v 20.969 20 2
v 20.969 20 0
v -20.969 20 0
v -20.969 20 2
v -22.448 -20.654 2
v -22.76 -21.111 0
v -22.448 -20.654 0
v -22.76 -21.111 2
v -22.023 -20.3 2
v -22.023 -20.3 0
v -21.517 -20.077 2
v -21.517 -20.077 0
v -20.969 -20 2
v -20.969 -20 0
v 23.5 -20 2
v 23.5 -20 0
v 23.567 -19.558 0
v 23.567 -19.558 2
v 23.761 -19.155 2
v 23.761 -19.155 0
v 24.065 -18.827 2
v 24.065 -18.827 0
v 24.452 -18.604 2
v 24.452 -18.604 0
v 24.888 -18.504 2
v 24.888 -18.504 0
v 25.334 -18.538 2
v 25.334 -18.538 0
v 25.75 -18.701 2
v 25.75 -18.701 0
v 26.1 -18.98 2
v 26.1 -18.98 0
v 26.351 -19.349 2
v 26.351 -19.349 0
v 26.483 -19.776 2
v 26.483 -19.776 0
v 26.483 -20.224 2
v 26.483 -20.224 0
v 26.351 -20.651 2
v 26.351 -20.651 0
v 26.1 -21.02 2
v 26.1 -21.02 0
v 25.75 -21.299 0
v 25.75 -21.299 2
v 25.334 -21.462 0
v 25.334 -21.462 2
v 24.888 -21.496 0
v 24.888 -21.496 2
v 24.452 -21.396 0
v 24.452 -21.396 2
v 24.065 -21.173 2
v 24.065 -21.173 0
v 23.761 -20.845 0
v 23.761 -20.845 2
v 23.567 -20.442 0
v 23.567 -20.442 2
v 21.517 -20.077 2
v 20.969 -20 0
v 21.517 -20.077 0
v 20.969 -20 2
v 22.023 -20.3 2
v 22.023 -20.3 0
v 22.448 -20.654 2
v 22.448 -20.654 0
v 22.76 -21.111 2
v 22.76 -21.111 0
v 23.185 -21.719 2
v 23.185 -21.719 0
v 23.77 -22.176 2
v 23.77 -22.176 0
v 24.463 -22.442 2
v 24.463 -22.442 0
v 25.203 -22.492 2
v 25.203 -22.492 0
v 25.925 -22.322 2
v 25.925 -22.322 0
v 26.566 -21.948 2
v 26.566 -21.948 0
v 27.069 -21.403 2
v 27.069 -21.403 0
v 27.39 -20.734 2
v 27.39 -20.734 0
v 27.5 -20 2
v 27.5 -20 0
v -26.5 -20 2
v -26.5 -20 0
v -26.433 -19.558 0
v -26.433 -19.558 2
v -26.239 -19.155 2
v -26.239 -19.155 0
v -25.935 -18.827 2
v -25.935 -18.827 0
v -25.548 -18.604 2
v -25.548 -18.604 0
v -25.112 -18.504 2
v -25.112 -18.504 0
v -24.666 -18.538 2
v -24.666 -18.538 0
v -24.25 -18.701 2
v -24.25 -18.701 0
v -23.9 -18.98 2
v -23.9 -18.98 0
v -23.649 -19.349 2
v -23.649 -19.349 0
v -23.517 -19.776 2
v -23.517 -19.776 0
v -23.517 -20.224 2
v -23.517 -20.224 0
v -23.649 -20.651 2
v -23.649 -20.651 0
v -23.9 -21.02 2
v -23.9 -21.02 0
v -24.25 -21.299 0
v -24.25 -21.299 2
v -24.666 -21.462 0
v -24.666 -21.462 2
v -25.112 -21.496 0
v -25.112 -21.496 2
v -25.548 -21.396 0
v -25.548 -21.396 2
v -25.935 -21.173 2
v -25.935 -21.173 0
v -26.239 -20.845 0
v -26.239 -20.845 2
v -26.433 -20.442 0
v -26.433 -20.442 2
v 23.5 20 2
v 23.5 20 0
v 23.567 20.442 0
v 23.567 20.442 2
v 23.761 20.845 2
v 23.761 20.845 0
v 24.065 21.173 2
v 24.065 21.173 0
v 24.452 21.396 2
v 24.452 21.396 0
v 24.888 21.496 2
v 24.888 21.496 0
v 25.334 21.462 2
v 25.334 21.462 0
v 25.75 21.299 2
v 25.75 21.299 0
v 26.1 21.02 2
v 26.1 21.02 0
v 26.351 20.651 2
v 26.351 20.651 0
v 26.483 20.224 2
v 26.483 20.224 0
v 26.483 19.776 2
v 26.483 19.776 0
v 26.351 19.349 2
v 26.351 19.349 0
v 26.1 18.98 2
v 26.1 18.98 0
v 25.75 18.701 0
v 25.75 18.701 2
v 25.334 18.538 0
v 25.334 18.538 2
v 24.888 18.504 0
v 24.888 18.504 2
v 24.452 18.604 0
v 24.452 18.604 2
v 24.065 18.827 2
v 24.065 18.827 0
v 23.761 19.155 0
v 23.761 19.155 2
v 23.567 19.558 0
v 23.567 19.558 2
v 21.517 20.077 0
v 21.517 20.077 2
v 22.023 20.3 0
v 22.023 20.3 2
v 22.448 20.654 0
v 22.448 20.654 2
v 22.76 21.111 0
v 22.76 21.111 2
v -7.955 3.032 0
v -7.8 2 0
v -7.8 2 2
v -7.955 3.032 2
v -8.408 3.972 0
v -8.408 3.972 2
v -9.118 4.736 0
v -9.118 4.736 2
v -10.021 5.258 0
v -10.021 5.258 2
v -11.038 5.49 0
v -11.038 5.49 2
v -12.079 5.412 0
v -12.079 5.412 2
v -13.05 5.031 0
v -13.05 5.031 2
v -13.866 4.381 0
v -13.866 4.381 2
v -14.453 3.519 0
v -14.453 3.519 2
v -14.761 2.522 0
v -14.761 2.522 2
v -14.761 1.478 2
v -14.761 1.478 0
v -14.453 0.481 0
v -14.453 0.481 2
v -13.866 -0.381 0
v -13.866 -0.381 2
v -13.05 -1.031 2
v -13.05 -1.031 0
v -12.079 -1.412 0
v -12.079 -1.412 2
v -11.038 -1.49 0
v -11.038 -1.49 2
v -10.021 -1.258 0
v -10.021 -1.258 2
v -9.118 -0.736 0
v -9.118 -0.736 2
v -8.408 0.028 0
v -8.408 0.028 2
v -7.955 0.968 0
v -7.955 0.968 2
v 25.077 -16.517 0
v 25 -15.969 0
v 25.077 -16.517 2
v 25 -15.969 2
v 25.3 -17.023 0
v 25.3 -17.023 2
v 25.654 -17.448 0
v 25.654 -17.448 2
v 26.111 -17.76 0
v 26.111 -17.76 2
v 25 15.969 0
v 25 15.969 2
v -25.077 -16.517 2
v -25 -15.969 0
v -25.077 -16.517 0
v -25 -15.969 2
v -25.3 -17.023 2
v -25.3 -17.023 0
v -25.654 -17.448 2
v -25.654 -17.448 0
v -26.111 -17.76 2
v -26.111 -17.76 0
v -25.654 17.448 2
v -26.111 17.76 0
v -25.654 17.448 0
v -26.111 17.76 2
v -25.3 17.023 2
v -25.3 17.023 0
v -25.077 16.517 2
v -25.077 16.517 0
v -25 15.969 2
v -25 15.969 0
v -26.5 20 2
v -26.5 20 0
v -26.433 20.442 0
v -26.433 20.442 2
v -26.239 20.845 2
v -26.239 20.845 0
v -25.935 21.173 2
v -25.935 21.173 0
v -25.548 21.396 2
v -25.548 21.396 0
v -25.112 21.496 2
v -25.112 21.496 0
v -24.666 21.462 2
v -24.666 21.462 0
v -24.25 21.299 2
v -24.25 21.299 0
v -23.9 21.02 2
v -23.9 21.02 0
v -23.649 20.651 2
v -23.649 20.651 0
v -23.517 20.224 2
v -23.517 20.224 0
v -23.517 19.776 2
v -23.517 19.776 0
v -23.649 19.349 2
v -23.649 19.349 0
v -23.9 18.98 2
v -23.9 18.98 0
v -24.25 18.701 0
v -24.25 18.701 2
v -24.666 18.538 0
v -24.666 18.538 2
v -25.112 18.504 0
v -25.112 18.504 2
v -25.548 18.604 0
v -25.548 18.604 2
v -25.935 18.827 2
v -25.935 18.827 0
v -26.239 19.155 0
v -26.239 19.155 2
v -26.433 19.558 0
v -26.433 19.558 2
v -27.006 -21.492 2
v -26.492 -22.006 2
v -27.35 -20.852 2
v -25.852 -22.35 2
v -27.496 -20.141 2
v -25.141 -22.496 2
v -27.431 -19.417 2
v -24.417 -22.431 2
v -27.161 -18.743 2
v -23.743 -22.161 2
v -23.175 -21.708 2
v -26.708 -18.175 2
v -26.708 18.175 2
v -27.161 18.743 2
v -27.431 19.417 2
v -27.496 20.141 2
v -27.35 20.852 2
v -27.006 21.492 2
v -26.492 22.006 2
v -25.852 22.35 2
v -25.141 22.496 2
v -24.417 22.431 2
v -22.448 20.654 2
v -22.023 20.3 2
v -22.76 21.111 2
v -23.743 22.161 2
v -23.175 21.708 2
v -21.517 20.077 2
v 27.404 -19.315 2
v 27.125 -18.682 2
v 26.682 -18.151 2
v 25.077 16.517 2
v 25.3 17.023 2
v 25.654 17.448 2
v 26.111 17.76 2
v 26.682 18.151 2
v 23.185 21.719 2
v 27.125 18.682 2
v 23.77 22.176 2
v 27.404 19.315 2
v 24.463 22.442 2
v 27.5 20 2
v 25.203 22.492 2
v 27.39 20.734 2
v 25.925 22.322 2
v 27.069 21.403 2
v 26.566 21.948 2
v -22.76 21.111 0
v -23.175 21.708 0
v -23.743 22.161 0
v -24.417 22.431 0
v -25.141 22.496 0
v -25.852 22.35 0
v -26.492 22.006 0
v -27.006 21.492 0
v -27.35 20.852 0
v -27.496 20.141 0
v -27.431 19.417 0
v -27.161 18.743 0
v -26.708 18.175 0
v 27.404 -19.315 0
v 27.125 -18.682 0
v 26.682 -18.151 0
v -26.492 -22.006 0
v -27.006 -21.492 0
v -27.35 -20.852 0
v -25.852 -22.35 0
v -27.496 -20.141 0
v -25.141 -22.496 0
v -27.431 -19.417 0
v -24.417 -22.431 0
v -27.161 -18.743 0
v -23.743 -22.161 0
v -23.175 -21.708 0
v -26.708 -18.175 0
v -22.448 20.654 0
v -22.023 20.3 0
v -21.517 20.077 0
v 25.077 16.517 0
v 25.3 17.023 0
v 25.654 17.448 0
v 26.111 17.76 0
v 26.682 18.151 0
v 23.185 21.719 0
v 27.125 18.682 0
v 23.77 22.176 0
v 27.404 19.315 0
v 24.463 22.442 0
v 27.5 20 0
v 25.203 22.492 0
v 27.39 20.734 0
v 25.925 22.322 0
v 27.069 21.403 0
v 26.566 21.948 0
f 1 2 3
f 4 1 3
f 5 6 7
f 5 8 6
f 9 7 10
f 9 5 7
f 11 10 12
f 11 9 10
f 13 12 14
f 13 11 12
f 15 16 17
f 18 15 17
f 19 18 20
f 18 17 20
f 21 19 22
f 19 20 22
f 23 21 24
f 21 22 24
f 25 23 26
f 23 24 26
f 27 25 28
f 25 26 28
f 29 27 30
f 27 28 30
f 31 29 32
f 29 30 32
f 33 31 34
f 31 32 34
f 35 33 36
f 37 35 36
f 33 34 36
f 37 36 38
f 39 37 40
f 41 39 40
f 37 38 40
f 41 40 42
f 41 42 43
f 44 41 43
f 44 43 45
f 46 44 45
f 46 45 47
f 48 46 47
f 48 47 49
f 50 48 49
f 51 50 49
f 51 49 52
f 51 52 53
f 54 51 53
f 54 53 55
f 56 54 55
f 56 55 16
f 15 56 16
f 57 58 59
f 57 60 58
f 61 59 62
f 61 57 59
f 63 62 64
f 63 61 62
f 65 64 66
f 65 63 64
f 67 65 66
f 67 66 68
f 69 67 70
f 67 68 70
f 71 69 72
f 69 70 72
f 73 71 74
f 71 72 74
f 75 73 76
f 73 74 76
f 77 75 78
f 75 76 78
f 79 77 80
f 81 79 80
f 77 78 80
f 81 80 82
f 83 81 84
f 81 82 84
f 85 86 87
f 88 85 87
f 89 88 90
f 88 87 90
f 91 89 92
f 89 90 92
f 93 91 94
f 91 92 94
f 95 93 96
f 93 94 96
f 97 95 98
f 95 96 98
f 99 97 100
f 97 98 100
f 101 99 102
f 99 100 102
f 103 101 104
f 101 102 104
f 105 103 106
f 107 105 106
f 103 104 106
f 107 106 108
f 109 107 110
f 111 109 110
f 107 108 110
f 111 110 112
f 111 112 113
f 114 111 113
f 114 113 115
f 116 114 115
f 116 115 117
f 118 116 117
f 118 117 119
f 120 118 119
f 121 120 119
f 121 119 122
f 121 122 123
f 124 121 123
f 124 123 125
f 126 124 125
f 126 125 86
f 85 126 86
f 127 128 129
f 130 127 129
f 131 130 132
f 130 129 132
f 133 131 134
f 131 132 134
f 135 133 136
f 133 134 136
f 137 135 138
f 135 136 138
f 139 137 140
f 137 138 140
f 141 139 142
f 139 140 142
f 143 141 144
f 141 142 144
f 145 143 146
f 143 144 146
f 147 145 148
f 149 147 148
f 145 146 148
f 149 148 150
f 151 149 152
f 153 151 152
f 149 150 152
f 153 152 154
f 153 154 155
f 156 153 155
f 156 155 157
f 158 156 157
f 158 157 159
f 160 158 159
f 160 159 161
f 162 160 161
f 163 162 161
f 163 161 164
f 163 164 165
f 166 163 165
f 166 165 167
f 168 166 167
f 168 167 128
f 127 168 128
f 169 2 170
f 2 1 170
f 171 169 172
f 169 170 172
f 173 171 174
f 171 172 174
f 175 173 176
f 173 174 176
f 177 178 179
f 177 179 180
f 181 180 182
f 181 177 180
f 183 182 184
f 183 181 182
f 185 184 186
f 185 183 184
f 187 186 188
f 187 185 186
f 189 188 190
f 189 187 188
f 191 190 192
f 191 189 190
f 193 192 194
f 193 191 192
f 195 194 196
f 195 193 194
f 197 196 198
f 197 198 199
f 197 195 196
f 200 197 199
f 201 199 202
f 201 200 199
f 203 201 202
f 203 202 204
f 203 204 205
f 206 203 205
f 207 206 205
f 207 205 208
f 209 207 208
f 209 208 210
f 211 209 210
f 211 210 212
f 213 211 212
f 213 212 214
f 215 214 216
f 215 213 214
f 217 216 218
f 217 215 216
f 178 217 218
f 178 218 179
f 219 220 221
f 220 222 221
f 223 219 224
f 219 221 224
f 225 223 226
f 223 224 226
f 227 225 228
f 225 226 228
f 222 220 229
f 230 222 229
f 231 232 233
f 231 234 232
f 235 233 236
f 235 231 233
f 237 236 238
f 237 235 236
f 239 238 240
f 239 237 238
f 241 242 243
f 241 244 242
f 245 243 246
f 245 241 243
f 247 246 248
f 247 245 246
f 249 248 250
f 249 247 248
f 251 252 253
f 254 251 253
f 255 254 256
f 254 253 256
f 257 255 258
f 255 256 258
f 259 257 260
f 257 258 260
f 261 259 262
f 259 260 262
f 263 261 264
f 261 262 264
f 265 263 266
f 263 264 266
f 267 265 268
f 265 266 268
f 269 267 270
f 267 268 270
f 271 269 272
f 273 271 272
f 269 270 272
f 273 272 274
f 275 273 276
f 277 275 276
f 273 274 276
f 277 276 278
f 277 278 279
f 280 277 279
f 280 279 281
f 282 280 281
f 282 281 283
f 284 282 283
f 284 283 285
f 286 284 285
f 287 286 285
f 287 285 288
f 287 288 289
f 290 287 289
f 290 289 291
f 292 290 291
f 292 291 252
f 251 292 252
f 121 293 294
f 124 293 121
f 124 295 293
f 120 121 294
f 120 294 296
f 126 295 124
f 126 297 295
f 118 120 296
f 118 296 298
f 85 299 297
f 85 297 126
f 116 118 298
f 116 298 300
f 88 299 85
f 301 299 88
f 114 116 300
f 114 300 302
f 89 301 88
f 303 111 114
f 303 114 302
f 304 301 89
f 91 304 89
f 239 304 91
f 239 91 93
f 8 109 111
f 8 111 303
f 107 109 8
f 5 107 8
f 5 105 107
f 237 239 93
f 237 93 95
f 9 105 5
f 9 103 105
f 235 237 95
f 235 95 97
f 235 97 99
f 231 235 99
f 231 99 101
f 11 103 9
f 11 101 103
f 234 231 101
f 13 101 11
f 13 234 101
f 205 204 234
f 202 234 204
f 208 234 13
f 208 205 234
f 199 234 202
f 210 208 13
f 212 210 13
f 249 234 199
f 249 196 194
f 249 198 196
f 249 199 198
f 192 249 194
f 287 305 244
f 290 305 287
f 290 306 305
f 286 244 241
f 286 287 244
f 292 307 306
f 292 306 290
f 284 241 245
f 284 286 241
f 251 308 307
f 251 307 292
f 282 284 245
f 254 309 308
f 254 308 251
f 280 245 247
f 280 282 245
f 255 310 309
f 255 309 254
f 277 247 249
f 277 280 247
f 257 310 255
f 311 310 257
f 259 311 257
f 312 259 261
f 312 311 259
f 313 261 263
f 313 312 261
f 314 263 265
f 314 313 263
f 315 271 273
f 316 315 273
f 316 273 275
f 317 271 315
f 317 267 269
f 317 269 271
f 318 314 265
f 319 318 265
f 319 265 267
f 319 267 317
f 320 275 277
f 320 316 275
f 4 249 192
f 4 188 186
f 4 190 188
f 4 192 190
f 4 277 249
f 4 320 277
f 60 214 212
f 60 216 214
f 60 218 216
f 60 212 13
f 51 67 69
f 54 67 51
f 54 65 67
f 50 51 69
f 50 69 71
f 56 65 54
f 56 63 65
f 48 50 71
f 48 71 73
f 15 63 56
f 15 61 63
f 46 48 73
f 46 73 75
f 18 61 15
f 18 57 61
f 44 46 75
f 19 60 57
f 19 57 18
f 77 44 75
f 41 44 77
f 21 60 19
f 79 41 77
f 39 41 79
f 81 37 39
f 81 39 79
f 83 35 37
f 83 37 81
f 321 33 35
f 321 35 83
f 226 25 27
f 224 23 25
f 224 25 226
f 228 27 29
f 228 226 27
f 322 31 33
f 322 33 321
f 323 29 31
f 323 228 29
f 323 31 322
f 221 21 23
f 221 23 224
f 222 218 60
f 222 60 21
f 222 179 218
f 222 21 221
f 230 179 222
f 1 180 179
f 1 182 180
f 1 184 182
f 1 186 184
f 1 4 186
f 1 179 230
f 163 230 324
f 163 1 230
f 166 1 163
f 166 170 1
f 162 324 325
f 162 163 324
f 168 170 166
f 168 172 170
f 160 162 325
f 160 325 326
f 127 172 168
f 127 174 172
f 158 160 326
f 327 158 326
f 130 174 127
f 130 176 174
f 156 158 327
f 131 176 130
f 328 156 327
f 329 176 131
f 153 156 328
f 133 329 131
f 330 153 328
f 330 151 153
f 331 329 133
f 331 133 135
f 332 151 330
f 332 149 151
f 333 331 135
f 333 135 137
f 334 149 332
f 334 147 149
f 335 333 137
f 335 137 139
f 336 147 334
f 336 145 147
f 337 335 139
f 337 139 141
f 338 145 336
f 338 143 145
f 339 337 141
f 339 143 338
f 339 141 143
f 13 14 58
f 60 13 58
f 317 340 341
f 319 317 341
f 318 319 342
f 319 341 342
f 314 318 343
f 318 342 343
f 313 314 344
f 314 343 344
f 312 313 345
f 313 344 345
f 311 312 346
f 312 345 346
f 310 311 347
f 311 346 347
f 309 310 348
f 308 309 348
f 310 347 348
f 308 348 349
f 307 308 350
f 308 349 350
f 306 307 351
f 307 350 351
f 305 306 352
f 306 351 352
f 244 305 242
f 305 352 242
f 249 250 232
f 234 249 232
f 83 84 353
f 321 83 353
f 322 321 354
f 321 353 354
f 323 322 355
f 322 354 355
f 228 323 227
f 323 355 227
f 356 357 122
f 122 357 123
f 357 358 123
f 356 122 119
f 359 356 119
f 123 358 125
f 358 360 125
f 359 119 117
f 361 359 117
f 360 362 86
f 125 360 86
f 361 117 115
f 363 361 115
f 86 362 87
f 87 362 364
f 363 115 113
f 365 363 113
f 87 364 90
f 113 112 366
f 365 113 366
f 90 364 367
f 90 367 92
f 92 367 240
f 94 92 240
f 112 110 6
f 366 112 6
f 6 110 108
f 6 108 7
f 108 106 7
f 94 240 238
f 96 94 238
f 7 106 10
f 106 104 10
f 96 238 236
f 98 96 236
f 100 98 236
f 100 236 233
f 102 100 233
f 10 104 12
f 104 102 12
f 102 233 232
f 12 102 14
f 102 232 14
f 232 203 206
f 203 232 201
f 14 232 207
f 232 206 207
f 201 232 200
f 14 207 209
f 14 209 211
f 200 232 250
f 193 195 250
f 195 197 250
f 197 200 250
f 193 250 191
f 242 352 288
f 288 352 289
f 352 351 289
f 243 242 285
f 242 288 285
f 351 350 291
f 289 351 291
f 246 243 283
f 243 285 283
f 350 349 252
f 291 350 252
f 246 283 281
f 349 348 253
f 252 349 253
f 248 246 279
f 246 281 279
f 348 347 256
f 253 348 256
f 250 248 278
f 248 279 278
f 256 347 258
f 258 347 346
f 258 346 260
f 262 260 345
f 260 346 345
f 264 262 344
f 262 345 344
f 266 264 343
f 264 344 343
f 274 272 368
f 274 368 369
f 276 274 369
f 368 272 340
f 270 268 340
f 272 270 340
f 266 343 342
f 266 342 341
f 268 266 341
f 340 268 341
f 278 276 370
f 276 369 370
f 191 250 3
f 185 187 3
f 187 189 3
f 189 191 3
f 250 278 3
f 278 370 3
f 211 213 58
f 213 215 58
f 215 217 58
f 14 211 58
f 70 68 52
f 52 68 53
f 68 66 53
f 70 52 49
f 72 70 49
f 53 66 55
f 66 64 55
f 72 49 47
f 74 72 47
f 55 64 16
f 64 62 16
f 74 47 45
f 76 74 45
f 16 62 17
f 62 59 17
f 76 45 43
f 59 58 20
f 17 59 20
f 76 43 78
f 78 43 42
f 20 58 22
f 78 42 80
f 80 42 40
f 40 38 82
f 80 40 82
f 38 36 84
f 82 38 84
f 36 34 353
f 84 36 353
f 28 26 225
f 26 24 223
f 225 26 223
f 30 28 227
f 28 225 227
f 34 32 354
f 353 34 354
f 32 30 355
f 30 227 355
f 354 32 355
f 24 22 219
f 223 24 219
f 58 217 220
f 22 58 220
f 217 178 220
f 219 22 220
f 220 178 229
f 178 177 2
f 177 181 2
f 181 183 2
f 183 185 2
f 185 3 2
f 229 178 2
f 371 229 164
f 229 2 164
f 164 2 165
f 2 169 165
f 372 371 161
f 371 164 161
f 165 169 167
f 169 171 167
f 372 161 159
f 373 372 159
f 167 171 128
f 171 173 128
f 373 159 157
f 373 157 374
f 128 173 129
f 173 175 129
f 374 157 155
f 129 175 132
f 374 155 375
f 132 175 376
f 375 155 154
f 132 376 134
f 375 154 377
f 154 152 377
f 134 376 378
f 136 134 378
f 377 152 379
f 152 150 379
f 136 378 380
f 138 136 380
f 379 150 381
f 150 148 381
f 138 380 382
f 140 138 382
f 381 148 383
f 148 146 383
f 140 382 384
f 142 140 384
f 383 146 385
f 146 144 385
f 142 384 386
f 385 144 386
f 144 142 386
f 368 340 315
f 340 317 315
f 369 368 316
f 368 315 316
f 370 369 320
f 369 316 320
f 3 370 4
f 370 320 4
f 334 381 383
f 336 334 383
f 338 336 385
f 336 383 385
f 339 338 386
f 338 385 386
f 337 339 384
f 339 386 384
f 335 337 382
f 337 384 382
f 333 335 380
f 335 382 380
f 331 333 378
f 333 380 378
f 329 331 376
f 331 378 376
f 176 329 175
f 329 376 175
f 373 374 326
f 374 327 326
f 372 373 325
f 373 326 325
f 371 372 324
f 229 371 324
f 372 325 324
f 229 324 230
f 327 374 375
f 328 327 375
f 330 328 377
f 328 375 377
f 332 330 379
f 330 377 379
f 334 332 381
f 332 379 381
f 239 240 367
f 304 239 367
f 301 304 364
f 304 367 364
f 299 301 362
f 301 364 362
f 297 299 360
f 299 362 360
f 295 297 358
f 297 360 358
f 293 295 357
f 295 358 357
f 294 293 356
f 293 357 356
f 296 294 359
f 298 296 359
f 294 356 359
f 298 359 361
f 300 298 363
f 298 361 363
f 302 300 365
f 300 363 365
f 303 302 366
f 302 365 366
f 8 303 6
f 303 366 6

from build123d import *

# Parameters (mm, degrees)
F0_R     = 3.5
F1_DEPTH = 2
F3_D     = 3
F4_R     = 2


with BuildPart() as f1:
    # F0 (on Top) → F1 (new body)
    with BuildSketch(Plane.XY):
        with BuildLine():
            Line((-25, 17.5), (-25, 20))
            Line((-25, 20), (-22.5, 20))
            ThreePointArc((-22.5, 20), (-26.767766953, 21.767766953), (-25, 17.5))
        make_face()
        with BuildLine():
            Line((-22.5, 20), (-25, 20))
            Line((-25, 20), (-25, 17.5))
            ThreePointArc((-25, 17.5), (-23.232233047, 18.232233047), (-22.5, 20))
        make_face()
        with BuildLine():
            Line((22.5, 20), (-22.5, 20))
            ThreePointArc((-22.5, 20), (-23.232233047, 18.232233047), (-25, 17.5))
            Line((-25, 17.5), (-25, -17.5))
            ThreePointArc((-25, -17.5), (-23.232233047, -18.232233047), (-22.5, -20))
            Line((-22.5, -20), (22.5, -20))
            ThreePointArc((22.5, -20), (23.232233047, -18.232233047), (25, -17.5))
            Line((25, -17.5), (25, 17.5))
            ThreePointArc((25, 17.5), (23.232233047, 18.232233047), (22.5, 20))
        make_face()
        with Locations((-11.3, 2)):
            Circle(F0_R, mode=Mode.SUBTRACT)
        with BuildLine():
            ThreePointArc((27.5, 20), (25, 22.5), (22.5, 20))
            Line((22.5, 20), (25, 20))
            Line((25, 20), (25, 17.5))
            ThreePointArc((25, 17.5), (26.767766953, 18.232233047), (27.5, 20))
        make_face()
        with BuildLine():
            Line((25, 20), (22.5, 20))
            ThreePointArc((22.5, 20), (23.232233047, 18.232233047), (25, 17.5))
            Line((25, 17.5), (25, 20))
        make_face()
        with BuildLine():
            ThreePointArc((-22.5, -20), (-23.232233047, -18.232233047), (-25, -17.5))
            Line((-25, -17.5), (-25, -20))
            Line((-25, -20), (-22.5, -20))
        make_face()
        with BuildLine():
            Line((-25, -20), (-25, -17.5))
            ThreePointArc((-25, -17.5), (-26.767766953, -21.767766953), (-22.5, -20))
            Line((-22.5, -20), (-25, -20))
        make_face()
        with BuildLine():
            ThreePointArc((27.5, -20), (26.767766953, -18.232233047), (25, -17.5))
            Line((25, -17.5), (25, -20))
            Line((25, -20), (22.5, -20))
            ThreePointArc((22.5, -20), (25, -22.5), (27.5, -20))
        make_face()
        with BuildLine():
            Line((25, -20), (25, -17.5))
            ThreePointArc((25, -17.5), (23.232233047, -18.232233047), (22.5, -20))
            Line((22.5, -20), (25, -20))
        make_face()
    extrude(amount=F1_DEPTH)

    # F3 (through all)
    with Locations(Plane.XY.offset(2)):
        with Locations((-25, 20), (-25, -20), (25, 20), (25, -20)):
            Hole(F3_D / 2)

    # F4
    f4_edges = [f1.edges().sort_by_distance(p)[0] for p in [
        (-25, 17.5, 1),
        (-22.5, 20, 1),
        (22.5, 20, 1),
        (25, 17.5, 1),
        (25, -17.5, 1),
        (22.5, -20, 1),
        (-22.5, -20, 1),
        (-25, -17.5, 1),
    ]]
    fillet(f4_edges, radius=F4_R)


solid = f1.part
